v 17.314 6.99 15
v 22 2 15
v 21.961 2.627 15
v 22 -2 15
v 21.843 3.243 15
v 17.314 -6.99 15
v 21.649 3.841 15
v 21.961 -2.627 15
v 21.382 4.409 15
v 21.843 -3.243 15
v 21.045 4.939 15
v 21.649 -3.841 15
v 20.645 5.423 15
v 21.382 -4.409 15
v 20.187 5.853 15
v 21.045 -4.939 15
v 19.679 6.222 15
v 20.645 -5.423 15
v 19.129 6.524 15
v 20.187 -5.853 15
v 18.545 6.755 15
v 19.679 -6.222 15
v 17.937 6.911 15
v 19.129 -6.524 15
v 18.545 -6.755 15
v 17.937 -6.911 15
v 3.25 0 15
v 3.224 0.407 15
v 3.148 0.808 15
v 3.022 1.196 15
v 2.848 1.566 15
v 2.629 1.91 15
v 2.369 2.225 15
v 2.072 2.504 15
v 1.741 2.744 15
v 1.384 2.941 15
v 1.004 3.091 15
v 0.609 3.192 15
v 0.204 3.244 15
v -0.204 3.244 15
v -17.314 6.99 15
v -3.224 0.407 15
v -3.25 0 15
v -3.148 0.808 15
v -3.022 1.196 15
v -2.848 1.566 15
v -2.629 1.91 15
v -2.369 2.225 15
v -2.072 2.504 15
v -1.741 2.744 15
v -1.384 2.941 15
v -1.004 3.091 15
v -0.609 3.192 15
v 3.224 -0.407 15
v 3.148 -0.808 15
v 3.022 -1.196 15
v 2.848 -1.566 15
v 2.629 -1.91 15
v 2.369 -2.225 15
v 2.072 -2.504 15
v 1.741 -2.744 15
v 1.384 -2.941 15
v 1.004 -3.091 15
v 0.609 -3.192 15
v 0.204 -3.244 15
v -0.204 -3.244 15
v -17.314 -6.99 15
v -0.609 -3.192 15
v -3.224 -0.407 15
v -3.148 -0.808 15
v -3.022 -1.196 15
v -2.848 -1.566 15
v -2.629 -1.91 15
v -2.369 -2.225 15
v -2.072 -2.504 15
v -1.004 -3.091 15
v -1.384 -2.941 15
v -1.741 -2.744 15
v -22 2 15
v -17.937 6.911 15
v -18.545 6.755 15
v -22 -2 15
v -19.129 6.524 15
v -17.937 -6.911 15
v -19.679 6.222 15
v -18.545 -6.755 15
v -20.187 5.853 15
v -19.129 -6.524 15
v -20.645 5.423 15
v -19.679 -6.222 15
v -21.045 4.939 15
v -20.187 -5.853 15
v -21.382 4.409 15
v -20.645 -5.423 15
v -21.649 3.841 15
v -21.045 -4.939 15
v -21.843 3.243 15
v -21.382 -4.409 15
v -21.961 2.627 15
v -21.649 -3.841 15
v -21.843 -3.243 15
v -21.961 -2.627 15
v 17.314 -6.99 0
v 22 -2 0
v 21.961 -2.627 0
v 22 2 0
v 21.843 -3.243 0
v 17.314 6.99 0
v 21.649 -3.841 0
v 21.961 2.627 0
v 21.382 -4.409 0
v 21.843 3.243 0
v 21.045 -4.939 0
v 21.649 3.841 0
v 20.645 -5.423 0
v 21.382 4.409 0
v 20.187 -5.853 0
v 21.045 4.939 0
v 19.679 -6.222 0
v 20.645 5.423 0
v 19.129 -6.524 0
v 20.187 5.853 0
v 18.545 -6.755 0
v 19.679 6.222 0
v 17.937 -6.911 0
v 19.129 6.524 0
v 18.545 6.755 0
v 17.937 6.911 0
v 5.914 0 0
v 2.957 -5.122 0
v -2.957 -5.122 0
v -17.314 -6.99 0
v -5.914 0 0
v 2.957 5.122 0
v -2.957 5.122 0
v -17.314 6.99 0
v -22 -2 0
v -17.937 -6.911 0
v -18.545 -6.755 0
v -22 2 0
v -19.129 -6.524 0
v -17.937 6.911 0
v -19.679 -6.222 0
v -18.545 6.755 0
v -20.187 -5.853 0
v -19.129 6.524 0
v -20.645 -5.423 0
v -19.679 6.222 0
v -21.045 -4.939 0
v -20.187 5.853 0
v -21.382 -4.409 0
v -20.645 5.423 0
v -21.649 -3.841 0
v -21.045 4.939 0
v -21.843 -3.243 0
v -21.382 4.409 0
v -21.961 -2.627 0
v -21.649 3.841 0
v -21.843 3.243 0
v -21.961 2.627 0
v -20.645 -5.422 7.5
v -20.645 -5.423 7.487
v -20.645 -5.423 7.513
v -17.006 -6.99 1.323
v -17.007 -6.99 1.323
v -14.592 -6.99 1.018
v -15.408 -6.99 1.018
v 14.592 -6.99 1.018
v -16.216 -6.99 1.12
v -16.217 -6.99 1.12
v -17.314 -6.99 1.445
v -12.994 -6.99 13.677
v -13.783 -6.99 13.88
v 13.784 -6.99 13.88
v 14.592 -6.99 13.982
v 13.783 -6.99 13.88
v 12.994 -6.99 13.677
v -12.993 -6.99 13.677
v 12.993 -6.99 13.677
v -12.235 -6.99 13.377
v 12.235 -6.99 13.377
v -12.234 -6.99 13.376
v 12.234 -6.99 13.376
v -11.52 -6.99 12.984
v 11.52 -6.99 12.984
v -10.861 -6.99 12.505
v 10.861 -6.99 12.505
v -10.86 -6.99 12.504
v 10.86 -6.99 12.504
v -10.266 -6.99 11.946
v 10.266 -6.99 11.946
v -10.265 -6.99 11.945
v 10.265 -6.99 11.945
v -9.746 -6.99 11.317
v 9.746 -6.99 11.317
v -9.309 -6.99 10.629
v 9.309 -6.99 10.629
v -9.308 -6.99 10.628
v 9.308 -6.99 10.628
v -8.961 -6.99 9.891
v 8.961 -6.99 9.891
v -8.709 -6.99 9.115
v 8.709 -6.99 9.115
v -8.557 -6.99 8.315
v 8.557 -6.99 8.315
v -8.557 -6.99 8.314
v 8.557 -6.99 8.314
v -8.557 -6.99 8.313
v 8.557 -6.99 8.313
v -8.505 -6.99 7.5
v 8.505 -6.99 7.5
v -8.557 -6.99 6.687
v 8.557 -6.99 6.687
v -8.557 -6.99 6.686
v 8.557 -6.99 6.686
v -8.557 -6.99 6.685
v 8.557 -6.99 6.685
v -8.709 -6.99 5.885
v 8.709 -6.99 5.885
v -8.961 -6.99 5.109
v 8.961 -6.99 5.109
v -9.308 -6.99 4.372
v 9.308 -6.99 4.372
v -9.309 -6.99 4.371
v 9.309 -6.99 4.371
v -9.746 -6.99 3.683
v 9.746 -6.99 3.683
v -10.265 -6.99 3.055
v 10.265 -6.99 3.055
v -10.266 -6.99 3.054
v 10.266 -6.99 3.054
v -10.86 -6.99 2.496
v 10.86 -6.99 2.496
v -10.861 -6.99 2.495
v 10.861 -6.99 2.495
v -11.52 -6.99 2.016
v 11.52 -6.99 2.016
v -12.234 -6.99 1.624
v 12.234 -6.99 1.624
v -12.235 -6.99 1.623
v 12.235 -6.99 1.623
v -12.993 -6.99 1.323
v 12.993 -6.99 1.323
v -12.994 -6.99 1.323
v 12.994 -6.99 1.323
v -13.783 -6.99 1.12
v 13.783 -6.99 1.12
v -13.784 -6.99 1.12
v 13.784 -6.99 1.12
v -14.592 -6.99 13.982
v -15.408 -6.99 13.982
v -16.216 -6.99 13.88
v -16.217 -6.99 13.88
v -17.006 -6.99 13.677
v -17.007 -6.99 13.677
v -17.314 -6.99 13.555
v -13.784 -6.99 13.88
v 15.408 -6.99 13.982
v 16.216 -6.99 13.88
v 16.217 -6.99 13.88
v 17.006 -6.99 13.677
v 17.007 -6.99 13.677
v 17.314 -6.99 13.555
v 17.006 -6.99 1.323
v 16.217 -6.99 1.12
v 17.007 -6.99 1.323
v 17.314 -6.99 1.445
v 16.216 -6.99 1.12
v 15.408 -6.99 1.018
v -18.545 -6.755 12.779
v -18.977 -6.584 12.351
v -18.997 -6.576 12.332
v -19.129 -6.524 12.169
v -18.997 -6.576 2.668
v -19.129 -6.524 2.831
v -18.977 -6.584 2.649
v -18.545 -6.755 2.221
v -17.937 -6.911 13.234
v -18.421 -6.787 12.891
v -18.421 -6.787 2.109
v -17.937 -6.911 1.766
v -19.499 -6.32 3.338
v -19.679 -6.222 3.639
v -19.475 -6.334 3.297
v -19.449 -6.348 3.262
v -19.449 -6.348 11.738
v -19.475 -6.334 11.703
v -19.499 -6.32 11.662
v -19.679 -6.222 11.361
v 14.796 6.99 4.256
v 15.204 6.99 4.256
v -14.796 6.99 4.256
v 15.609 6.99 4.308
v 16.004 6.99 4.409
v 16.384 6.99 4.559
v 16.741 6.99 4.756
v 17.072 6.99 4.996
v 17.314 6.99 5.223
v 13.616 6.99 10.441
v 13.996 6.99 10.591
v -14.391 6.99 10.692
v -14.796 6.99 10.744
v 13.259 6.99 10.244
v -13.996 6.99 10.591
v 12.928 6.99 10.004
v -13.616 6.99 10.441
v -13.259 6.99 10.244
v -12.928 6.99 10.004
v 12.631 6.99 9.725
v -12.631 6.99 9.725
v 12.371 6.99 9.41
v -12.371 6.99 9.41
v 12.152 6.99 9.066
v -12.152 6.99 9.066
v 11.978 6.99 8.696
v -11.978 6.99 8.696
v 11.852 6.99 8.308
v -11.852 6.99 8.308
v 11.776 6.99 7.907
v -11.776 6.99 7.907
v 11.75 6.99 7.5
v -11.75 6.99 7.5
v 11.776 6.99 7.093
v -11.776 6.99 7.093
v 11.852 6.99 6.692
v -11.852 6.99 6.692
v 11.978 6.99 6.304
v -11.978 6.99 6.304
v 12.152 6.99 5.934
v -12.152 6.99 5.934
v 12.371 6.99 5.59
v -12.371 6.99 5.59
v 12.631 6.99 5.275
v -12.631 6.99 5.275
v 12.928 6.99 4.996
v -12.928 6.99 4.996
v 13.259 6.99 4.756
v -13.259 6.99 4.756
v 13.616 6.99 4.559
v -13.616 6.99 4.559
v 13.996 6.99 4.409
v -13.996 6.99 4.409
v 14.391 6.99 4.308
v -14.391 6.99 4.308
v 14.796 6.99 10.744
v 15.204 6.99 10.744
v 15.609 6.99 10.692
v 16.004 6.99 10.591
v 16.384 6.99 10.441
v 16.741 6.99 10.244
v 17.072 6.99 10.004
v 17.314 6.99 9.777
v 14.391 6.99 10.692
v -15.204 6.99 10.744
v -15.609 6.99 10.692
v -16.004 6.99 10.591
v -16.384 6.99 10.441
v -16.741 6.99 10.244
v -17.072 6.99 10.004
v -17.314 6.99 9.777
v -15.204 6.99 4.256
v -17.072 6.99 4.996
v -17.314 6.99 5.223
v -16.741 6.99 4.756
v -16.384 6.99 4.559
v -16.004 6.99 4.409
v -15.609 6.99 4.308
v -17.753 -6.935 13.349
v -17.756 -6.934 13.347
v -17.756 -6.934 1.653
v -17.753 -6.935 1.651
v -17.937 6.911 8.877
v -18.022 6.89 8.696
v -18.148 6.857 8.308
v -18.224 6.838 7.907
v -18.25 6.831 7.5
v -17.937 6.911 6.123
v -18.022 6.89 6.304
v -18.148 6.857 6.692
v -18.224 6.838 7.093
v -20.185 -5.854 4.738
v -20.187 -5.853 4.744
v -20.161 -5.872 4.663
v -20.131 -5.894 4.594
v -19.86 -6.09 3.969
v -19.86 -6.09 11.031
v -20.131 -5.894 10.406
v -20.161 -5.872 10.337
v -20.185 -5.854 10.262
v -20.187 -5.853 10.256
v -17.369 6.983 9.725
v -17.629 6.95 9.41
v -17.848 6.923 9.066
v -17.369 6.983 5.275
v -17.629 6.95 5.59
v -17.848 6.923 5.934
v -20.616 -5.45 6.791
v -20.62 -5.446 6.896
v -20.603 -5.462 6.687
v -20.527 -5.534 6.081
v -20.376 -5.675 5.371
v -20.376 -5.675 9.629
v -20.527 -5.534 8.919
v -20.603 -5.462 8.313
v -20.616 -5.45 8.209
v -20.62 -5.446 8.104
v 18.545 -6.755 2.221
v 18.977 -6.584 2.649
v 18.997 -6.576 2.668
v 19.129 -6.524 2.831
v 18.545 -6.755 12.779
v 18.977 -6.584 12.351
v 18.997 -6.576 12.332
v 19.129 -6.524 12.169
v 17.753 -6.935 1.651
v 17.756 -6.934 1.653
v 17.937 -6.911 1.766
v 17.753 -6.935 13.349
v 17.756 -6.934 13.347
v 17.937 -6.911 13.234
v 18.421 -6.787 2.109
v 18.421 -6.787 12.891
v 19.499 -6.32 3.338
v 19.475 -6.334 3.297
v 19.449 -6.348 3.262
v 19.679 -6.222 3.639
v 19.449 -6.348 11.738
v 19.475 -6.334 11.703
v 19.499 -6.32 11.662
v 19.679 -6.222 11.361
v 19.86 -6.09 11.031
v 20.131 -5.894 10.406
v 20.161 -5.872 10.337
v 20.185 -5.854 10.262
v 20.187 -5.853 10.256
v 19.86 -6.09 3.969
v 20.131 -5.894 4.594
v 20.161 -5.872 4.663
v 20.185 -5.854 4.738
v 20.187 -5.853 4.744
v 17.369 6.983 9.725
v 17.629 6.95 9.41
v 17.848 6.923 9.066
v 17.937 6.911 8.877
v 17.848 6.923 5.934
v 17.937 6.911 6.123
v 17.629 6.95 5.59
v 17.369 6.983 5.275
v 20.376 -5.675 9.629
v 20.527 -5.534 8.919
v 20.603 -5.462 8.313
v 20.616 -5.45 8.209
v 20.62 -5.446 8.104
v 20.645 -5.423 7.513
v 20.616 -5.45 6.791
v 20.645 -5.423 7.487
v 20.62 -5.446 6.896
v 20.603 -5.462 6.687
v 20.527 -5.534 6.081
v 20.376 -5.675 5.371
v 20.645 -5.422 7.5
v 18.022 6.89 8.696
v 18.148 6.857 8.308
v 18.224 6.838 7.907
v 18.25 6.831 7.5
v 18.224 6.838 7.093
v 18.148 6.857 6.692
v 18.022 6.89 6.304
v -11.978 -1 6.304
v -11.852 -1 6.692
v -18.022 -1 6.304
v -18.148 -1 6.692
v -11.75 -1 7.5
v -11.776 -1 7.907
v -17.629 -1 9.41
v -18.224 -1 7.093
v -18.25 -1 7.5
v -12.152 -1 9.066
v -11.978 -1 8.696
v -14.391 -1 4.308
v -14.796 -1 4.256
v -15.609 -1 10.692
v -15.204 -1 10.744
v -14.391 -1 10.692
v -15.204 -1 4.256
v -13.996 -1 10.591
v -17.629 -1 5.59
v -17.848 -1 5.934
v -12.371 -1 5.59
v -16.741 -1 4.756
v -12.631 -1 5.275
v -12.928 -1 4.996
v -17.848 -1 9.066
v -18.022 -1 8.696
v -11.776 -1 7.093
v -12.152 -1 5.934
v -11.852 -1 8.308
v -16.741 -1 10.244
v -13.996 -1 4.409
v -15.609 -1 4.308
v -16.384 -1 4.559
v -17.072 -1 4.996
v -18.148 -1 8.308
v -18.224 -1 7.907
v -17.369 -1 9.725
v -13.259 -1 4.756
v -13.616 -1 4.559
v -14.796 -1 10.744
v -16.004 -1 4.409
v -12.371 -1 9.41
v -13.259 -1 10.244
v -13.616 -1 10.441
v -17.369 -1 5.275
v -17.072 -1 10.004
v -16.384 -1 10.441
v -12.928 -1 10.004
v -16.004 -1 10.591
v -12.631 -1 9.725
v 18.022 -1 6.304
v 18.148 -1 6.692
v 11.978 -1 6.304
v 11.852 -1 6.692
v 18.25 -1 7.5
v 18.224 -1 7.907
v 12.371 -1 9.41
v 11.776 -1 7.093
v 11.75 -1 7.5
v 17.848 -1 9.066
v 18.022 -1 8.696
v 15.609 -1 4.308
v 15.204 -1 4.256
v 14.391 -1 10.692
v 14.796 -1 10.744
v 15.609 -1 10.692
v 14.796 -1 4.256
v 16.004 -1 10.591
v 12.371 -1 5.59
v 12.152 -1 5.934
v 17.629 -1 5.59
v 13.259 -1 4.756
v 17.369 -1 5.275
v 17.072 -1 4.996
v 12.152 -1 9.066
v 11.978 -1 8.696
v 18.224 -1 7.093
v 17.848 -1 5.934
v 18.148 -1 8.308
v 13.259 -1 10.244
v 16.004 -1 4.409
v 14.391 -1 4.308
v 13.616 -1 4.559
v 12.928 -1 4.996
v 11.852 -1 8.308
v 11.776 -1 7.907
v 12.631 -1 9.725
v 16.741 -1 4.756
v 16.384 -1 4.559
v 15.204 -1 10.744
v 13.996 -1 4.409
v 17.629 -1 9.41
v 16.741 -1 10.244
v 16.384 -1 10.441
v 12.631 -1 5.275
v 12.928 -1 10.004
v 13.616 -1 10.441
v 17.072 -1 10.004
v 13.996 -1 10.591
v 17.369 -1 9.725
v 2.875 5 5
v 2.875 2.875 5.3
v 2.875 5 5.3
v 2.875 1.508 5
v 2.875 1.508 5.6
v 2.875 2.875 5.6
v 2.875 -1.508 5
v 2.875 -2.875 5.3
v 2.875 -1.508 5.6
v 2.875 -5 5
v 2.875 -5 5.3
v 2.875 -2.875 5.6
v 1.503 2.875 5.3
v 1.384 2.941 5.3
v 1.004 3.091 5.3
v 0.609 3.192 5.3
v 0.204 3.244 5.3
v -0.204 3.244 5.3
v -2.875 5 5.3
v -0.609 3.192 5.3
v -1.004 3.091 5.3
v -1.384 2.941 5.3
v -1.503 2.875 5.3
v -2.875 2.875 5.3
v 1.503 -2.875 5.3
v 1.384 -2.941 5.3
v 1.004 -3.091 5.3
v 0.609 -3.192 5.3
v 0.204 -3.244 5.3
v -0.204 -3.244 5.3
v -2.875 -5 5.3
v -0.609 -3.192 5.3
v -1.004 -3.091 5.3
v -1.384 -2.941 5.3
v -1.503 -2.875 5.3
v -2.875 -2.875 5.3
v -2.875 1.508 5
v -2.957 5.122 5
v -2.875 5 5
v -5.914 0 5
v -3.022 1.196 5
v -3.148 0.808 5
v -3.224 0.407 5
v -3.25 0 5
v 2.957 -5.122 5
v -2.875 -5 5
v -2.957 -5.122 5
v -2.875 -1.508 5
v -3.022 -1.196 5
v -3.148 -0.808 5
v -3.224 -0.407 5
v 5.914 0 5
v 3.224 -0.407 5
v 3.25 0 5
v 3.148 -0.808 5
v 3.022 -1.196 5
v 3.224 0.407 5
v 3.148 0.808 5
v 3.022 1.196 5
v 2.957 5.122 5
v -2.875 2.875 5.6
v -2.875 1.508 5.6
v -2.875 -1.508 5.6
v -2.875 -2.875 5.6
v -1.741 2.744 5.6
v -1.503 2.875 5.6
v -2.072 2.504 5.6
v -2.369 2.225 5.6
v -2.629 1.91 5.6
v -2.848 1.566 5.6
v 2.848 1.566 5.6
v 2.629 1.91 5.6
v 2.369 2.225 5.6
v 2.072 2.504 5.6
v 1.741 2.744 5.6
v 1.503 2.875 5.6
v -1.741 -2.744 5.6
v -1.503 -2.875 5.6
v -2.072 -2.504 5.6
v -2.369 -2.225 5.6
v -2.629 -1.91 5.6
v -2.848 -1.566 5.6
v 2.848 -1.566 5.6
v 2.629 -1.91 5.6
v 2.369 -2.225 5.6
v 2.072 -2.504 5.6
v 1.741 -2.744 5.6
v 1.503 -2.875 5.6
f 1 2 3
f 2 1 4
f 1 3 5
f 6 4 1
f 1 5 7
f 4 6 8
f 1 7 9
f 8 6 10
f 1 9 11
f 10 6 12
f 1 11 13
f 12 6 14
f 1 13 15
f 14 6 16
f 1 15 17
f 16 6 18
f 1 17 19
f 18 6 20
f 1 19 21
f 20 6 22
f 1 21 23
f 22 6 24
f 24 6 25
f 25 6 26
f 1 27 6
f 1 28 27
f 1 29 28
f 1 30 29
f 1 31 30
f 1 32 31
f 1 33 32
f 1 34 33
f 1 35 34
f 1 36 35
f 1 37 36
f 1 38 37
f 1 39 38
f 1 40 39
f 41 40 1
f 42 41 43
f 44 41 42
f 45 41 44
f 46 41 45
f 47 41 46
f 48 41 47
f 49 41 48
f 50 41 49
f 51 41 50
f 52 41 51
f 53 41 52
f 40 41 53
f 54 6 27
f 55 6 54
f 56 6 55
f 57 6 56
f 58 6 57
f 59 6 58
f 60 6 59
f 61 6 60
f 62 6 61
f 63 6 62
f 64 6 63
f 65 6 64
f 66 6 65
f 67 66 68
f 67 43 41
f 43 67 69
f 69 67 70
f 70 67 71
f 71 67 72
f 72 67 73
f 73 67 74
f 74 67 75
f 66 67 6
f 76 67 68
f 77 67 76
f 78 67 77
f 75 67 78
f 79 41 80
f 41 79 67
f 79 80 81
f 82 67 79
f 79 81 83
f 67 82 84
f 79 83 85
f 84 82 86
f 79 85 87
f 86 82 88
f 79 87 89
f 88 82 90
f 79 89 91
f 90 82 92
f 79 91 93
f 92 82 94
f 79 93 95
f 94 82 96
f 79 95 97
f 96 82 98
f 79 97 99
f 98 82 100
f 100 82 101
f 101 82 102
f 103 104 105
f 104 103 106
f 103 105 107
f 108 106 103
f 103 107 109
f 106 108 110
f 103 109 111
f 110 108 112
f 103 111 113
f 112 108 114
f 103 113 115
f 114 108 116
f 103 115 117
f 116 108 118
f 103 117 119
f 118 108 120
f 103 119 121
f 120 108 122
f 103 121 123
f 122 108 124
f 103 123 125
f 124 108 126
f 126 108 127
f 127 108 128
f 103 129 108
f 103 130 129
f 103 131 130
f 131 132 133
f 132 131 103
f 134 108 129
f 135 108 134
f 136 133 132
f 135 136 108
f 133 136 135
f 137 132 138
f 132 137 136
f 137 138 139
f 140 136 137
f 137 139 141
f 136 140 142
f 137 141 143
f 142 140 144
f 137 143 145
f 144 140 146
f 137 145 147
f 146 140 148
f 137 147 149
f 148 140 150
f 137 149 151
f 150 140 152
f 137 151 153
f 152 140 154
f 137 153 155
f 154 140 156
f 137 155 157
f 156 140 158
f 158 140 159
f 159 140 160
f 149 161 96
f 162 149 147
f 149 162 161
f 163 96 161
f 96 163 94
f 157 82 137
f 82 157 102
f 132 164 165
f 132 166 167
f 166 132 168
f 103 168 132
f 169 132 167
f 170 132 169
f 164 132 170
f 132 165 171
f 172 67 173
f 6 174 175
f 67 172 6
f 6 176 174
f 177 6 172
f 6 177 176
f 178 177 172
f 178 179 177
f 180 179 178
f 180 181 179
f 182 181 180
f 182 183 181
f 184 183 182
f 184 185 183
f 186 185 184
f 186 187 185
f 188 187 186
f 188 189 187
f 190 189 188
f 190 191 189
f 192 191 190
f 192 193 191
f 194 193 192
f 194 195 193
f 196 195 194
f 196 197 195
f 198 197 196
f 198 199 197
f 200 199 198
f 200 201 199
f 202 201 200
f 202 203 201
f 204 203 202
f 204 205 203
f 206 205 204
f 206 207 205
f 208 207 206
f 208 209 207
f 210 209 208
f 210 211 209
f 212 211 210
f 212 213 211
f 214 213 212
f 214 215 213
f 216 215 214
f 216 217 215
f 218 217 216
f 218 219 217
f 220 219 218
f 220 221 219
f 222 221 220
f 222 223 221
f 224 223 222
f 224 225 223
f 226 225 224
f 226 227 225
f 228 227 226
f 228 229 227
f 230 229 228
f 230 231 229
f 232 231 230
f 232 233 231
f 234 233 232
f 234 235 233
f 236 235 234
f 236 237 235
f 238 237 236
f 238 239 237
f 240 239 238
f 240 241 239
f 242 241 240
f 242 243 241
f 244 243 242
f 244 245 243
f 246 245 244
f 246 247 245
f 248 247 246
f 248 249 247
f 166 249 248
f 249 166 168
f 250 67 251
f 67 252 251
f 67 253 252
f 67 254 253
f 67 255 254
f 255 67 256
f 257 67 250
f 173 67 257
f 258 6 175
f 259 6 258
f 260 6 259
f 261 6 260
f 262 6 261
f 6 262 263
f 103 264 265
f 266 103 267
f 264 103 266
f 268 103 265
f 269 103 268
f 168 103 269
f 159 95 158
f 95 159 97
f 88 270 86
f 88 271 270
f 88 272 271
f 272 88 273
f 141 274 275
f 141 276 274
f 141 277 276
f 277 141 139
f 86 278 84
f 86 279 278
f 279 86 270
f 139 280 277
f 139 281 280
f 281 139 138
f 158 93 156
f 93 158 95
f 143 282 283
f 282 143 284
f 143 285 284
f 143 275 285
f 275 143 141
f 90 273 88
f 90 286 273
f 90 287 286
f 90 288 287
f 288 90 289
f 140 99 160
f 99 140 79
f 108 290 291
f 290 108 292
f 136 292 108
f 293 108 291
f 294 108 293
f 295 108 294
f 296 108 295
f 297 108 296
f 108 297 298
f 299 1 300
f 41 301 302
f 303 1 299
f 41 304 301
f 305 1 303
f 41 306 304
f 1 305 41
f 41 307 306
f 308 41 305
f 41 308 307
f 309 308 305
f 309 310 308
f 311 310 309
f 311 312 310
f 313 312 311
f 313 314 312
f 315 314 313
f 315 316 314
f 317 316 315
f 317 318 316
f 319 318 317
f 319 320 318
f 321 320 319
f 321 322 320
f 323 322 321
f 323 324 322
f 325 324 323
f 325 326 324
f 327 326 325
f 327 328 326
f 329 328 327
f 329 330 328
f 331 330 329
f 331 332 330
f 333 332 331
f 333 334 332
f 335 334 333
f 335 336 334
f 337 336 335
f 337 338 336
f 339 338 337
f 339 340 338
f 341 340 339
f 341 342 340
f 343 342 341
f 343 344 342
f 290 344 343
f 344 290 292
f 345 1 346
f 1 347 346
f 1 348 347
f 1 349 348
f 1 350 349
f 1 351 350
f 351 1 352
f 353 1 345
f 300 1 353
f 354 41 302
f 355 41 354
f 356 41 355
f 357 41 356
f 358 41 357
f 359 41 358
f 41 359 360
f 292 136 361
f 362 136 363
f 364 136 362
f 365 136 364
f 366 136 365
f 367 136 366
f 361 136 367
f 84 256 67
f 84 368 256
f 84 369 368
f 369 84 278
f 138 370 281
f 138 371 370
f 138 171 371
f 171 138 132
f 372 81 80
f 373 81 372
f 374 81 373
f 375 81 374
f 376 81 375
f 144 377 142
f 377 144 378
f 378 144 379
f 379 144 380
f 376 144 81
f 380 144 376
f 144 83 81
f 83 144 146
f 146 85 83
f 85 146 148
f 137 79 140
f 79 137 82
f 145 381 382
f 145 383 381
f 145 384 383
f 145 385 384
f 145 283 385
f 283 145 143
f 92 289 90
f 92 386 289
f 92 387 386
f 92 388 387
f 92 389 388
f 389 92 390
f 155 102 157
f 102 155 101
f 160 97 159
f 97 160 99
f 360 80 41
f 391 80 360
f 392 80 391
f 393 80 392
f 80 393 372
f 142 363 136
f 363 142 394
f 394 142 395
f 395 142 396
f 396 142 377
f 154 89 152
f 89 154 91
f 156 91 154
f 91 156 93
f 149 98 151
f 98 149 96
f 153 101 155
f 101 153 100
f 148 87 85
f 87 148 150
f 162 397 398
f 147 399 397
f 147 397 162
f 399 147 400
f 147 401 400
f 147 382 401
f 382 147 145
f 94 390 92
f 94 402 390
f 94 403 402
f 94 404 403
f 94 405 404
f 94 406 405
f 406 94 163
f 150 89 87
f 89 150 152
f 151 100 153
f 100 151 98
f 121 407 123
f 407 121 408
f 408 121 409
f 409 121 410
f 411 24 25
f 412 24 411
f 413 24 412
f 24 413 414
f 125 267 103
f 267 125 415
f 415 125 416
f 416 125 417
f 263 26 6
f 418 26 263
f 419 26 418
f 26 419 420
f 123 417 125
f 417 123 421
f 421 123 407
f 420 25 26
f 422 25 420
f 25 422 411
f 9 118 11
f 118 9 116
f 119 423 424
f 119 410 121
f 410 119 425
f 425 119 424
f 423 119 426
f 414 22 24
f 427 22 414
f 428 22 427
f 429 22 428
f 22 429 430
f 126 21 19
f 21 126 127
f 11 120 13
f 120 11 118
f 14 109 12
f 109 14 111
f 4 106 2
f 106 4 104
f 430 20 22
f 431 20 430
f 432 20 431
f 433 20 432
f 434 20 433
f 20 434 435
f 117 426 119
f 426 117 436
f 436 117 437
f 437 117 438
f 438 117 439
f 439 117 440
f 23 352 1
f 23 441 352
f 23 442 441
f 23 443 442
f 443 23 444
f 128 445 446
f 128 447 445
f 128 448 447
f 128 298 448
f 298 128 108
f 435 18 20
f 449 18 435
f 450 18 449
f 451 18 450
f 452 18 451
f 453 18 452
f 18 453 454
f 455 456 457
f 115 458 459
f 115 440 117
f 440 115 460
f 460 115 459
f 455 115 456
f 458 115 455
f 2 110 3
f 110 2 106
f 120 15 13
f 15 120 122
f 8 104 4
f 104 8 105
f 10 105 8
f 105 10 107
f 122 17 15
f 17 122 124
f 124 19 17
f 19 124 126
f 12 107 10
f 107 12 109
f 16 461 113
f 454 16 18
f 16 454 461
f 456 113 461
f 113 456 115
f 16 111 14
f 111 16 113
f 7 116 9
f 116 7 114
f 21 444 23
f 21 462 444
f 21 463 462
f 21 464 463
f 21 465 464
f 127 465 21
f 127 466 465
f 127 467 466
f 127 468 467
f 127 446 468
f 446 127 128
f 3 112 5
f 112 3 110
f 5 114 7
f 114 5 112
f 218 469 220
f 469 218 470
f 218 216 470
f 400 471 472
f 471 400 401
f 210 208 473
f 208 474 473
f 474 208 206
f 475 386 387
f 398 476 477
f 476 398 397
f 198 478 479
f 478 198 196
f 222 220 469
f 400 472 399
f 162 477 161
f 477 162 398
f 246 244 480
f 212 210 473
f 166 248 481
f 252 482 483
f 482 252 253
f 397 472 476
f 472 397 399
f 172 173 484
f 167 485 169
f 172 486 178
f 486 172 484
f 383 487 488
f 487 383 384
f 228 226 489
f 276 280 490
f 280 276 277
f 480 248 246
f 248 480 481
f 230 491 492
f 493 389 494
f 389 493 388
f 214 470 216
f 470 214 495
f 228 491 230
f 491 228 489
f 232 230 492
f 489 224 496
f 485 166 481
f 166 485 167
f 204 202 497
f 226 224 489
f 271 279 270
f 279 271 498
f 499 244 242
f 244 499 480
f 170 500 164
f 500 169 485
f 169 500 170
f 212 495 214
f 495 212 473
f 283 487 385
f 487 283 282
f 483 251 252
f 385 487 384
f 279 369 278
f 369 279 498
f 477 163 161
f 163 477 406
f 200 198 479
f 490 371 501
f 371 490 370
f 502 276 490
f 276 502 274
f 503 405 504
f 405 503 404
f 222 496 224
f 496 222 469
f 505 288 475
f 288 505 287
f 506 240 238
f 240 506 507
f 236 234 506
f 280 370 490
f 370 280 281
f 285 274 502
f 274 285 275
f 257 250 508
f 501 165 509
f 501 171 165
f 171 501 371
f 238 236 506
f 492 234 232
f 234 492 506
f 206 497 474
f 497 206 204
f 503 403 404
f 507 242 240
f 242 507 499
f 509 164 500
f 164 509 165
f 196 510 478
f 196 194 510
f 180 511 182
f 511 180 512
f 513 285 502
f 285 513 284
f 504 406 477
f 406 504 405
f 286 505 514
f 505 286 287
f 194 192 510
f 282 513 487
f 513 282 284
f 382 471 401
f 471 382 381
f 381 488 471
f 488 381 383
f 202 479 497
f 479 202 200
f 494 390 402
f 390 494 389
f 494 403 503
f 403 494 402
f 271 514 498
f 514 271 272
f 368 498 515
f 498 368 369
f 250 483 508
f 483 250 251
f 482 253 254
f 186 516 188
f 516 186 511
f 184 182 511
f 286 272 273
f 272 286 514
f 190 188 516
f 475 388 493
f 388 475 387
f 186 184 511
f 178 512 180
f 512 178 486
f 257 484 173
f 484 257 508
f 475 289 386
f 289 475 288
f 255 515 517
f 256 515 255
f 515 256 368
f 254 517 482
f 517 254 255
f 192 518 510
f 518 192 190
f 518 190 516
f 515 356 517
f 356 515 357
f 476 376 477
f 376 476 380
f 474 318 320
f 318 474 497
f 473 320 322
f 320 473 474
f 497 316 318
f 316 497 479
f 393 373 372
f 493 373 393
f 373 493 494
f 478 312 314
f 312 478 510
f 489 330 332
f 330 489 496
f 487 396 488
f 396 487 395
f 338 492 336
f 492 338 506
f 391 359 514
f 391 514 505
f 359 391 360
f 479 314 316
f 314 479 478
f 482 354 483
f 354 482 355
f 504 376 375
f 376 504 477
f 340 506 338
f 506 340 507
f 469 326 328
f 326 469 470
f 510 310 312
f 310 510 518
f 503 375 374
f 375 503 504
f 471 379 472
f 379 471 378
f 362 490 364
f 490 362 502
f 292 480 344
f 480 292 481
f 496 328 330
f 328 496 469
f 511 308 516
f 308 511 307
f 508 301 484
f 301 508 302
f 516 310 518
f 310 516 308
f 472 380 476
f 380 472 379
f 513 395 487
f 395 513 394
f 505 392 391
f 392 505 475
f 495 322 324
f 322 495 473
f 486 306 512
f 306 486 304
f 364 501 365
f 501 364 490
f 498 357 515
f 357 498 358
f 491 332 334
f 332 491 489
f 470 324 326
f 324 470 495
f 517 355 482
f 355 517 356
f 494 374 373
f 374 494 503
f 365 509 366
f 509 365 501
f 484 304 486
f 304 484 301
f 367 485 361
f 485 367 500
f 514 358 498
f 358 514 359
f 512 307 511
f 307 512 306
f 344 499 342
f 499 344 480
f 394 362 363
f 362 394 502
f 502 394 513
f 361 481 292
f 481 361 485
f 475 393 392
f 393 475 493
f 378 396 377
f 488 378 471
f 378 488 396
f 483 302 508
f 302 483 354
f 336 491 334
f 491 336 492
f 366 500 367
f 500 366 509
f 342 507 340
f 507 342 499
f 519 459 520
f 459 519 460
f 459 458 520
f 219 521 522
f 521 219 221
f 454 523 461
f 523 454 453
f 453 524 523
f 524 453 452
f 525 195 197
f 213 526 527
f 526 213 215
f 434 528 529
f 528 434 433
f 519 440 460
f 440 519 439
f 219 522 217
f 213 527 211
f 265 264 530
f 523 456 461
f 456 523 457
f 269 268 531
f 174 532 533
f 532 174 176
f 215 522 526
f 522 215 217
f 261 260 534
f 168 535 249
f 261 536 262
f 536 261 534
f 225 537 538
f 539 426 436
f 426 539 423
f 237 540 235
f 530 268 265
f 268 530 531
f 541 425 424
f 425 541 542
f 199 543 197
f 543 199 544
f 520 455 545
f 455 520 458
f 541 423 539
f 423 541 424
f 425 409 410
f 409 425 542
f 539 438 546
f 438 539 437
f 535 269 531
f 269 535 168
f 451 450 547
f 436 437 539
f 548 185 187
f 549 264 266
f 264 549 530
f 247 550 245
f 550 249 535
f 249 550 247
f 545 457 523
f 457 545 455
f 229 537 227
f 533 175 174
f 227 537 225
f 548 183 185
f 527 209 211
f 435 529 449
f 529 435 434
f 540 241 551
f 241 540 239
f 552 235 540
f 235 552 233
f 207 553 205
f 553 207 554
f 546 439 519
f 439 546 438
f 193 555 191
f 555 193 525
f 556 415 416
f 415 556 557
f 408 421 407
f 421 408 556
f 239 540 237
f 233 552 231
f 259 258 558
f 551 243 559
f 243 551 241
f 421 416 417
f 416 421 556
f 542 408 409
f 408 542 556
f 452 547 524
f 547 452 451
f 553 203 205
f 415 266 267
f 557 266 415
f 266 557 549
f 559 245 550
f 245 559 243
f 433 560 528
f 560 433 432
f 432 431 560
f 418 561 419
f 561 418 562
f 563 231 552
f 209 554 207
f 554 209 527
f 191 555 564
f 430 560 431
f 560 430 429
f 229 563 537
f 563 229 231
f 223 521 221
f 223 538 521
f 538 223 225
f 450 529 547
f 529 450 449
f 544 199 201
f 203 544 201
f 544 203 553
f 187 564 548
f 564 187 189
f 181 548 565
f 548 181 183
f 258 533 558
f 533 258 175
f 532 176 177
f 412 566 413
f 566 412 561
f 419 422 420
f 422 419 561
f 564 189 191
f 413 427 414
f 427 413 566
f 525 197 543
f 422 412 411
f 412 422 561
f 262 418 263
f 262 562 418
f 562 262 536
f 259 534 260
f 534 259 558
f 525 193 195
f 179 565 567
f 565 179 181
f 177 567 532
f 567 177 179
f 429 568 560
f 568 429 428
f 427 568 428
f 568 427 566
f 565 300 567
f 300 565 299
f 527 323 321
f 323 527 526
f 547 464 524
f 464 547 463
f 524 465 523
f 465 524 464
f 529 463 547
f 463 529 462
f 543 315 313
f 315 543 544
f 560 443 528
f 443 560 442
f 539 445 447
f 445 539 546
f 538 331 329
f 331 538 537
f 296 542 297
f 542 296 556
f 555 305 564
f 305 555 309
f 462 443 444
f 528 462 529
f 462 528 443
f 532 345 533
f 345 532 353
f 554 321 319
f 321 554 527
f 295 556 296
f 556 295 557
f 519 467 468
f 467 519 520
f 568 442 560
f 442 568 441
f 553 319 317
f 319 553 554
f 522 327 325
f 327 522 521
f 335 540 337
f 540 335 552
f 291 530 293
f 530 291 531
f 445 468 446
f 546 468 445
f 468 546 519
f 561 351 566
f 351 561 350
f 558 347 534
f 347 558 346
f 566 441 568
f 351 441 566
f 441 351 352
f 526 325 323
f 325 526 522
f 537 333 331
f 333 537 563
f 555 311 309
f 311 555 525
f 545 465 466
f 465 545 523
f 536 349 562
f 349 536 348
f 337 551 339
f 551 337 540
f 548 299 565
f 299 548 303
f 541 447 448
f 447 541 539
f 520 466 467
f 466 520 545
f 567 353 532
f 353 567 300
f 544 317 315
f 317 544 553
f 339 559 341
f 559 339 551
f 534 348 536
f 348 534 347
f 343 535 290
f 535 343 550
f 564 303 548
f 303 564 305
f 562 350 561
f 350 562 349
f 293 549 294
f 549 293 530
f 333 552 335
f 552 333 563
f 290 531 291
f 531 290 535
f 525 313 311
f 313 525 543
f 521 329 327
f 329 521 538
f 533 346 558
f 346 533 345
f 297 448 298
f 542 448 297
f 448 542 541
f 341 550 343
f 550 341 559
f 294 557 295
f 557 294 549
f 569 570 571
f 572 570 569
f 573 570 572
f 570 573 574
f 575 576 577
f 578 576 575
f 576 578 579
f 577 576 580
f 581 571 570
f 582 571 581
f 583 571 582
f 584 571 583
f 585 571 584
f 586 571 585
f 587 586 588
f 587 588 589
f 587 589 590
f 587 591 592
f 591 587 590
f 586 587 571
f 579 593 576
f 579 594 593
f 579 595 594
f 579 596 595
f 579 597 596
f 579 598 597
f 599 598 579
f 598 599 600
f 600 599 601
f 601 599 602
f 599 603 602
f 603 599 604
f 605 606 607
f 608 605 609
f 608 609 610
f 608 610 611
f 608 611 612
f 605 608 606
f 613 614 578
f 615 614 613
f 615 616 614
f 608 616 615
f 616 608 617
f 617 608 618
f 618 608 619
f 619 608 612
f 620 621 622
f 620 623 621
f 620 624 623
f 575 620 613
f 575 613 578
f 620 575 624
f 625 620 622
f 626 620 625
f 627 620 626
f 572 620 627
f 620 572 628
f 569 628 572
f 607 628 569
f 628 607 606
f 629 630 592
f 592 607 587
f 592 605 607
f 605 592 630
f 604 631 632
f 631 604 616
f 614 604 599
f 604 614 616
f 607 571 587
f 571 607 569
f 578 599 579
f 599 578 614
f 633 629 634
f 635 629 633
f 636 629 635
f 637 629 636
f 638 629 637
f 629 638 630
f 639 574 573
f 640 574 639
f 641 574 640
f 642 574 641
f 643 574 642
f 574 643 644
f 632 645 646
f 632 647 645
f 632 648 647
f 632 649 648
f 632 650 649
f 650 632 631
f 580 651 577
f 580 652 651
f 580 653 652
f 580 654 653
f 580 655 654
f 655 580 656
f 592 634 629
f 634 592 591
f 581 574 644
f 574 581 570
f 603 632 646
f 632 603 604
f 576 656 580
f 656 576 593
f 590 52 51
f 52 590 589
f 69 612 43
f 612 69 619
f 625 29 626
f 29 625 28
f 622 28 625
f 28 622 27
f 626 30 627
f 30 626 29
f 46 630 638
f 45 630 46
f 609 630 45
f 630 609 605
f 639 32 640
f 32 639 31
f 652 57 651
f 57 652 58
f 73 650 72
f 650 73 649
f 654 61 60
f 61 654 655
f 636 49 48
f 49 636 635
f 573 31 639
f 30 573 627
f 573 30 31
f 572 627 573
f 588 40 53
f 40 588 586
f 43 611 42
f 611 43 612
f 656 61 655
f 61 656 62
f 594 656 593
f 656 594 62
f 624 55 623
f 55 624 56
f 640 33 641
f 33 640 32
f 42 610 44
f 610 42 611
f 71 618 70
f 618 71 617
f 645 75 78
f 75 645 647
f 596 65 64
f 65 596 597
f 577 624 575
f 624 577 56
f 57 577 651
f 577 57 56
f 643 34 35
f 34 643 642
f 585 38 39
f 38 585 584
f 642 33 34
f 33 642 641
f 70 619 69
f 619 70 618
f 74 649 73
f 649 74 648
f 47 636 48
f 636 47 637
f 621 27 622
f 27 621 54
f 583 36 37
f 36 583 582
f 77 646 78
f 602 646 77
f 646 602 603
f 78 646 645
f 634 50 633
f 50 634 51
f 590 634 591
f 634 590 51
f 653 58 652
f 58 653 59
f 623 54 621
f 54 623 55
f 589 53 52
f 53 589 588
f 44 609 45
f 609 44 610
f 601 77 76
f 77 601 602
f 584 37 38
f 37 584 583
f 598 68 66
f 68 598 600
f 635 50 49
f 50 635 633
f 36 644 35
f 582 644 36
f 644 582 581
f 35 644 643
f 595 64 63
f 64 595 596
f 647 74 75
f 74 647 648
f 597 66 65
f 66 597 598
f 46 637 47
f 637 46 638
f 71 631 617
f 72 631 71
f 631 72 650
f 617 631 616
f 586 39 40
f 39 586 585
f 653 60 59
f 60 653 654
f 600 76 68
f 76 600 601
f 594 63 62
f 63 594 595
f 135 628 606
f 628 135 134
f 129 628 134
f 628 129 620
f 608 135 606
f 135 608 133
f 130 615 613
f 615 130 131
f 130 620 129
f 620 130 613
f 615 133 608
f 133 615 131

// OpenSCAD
$fn = 50;


difference() {
	union() {
		cylinder(h = 15, r = 7.0000000000);
		translate(v = [-7.5000000000, 0.0000000000, 0]) {
			hull() {
				translate(v = [-9.5000000000, 2.0000000000, 0]) {
					cylinder(h = 15, r = 5);
				}
				translate(v = [9.5000000000, 2.0000000000, 0]) {
					cylinder(h = 15, r = 5);
				}
				translate(v = [-9.5000000000, -2.0000000000, 0]) {
					cylinder(h = 15, r = 5);
				}
				translate(v = [9.5000000000, -2.0000000000, 0]) {
					cylinder(h = 15, r = 5);
				}
			}
		}
		translate(v = [7.5000000000, 0.0000000000, 0]) {
			hull() {
				translate(v = [-9.5000000000, 2.0000000000, 0]) {
					cylinder(h = 15, r = 5);
				}
				translate(v = [9.5000000000, 2.0000000000, 0]) {
					cylinder(h = 15, r = 5);
				}
				translate(v = [-9.5000000000, -2.0000000000, 0]) {
					cylinder(h = 15, r = 5);
				}
				translate(v = [9.5000000000, -2.0000000000, 0]) {
					cylinder(h = 15, r = 5);
				}
			}
		}
	}
	union() {
		translate(v = [-15.0000000000, -7.0000000000, 7.5000000000]) {
			rotate(a = [90, 0, 0]) {
				difference() {
					union() {
						#translate(v = [0, 0, -14.0000000000]) {
							cylinder(h = 14, r = 2.2500000000);
						}
						#translate(v = [0, 0, -6]) {
							cylinder(h = 6, r1 = 3.2500000000, r2 = 6.5000000000);
						}
						#translate(v = [0, 0, -14.0000000000]) {
							cylinder(h = 14, r = 3.2500000000);
						}
						#translate(v = [0, 0, -14.0000000000]) {
							cylinder(h = 14, r = 2.2500000000);
						}
					}
					union();
				}
			}
		}
		translate(v = [15.0000000000, -7.0000000000, 7.5000000000]) {
			rotate(a = [90, 0, 0]) {
				difference() {
					union() {
						#translate(v = [0, 0, -14.0000000000]) {
							cylinder(h = 14, r = 2.2500000000);
						}
						#translate(v = [0, 0, -6]) {
							cylinder(h = 6, r1 = 3.2500000000, r2 = 6.5000000000);
						}
						#translate(v = [0, 0, -14.0000000000]) {
							cylinder(h = 14, r = 3.2500000000);
						}
						#translate(v = [0, 0, -14.0000000000]) {
							cylinder(h = 14, r = 2.2500000000);
						}
					}
					union();
				}
			}
		}
		translate(v = [0.0000000000, 0.0000000000, 0]) {
			rotate(a = [0, 0, 0]) {
				difference() {
					union() {
						#translate(v = [-2.8750000000, -5.0000000000, -0.3000000000]) {
							cube(size = [5.7500000000, 10, 0.3000000000]);
						}
						#translate(v = [-2.8750000000, -2.8750000000, -0.6000000000]) {
							cube(size = [5.7500000000, 5.7500000000, 0.3000000000]);
						}
						#translate(v = [-2.8750000000, -5.0000000000, 5]) {
							cube(size = [5.7500000000, 10, 0.3000000000]);
						}
						#translate(v = [-2.8750000000, -2.8750000000, 5.3000000000]) {
							cube(size = [5.7500000000, 5.7500000000, 0.3000000000]);
						}
						#translate(v = [0, 0, -100.0000000000]) {
							cylinder(h = 200, r = 3.2500000000);
						}
						#linear_extrude(height = 5) {
							polygon(points = [[5.9142500000, 0.0000000000], [2.9571250000, 5.1218907443], [-2.9571250000, 5.1218907443], [-5.9142500000, 0.0000000000], [-2.9571250000, -5.1218907443], [2.9571250000, -5.1218907443]]);
						}
						#translate(v = [-2.8750000000, -5.0000000000, -0.3000000000]) {
							cube(size = [5.7500000000, 10, 0.3000000000]);
						}
						#translate(v = [-2.8750000000, -2.8750000000, -0.6000000000]) {
							cube(size = [5.7500000000, 5.7500000000, 0.3000000000]);
						}
						#translate(v = [-2.8750000000, -5.0000000000, 5]) {
							cube(size = [5.7500000000, 10, 0.3000000000]);
						}
						#translate(v = [-2.8750000000, -2.8750000000, 5.3000000000]) {
							cube(size = [5.7500000000, 5.7500000000, 0.3000000000]);
						}
						#translate(v = [0, 0, -100.0000000000]) {
							cylinder(h = 200, r = 3.2500000000);
						}
						#translate(v = [-2.8750000000, -5.0000000000, -0.3000000000]) {
							cube(size = [5.7500000000, 10, 0.3000000000]);
						}
						#translate(v = [-2.8750000000, -2.8750000000, -0.6000000000]) {
							cube(size = [5.7500000000, 5.7500000000, 0.3000000000]);
						}
						#translate(v = [-2.8750000000, -5.0000000000, 5]) {
							cube(size = [5.7500000000, 10, 0.3000000000]);
						}
						#translate(v = [-2.8750000000, -2.8750000000, 5.3000000000]) {
							cube(size = [5.7500000000, 5.7500000000, 0.3000000000]);
						}
						#translate(v = [0, 0, -100.0000000000]) {
							cylinder(h = 200, r = 3.2500000000);
						}
					}
					union();
				}
			}
		}
		translate(v = [0, 0, -100]) {
			cylinder(h = 200, r = 3.2500000000);
		}
		translate(v = [0, 0, -100]) {
			cylinder(h = 200, r = 1.8000000000);
		}
	}
}
